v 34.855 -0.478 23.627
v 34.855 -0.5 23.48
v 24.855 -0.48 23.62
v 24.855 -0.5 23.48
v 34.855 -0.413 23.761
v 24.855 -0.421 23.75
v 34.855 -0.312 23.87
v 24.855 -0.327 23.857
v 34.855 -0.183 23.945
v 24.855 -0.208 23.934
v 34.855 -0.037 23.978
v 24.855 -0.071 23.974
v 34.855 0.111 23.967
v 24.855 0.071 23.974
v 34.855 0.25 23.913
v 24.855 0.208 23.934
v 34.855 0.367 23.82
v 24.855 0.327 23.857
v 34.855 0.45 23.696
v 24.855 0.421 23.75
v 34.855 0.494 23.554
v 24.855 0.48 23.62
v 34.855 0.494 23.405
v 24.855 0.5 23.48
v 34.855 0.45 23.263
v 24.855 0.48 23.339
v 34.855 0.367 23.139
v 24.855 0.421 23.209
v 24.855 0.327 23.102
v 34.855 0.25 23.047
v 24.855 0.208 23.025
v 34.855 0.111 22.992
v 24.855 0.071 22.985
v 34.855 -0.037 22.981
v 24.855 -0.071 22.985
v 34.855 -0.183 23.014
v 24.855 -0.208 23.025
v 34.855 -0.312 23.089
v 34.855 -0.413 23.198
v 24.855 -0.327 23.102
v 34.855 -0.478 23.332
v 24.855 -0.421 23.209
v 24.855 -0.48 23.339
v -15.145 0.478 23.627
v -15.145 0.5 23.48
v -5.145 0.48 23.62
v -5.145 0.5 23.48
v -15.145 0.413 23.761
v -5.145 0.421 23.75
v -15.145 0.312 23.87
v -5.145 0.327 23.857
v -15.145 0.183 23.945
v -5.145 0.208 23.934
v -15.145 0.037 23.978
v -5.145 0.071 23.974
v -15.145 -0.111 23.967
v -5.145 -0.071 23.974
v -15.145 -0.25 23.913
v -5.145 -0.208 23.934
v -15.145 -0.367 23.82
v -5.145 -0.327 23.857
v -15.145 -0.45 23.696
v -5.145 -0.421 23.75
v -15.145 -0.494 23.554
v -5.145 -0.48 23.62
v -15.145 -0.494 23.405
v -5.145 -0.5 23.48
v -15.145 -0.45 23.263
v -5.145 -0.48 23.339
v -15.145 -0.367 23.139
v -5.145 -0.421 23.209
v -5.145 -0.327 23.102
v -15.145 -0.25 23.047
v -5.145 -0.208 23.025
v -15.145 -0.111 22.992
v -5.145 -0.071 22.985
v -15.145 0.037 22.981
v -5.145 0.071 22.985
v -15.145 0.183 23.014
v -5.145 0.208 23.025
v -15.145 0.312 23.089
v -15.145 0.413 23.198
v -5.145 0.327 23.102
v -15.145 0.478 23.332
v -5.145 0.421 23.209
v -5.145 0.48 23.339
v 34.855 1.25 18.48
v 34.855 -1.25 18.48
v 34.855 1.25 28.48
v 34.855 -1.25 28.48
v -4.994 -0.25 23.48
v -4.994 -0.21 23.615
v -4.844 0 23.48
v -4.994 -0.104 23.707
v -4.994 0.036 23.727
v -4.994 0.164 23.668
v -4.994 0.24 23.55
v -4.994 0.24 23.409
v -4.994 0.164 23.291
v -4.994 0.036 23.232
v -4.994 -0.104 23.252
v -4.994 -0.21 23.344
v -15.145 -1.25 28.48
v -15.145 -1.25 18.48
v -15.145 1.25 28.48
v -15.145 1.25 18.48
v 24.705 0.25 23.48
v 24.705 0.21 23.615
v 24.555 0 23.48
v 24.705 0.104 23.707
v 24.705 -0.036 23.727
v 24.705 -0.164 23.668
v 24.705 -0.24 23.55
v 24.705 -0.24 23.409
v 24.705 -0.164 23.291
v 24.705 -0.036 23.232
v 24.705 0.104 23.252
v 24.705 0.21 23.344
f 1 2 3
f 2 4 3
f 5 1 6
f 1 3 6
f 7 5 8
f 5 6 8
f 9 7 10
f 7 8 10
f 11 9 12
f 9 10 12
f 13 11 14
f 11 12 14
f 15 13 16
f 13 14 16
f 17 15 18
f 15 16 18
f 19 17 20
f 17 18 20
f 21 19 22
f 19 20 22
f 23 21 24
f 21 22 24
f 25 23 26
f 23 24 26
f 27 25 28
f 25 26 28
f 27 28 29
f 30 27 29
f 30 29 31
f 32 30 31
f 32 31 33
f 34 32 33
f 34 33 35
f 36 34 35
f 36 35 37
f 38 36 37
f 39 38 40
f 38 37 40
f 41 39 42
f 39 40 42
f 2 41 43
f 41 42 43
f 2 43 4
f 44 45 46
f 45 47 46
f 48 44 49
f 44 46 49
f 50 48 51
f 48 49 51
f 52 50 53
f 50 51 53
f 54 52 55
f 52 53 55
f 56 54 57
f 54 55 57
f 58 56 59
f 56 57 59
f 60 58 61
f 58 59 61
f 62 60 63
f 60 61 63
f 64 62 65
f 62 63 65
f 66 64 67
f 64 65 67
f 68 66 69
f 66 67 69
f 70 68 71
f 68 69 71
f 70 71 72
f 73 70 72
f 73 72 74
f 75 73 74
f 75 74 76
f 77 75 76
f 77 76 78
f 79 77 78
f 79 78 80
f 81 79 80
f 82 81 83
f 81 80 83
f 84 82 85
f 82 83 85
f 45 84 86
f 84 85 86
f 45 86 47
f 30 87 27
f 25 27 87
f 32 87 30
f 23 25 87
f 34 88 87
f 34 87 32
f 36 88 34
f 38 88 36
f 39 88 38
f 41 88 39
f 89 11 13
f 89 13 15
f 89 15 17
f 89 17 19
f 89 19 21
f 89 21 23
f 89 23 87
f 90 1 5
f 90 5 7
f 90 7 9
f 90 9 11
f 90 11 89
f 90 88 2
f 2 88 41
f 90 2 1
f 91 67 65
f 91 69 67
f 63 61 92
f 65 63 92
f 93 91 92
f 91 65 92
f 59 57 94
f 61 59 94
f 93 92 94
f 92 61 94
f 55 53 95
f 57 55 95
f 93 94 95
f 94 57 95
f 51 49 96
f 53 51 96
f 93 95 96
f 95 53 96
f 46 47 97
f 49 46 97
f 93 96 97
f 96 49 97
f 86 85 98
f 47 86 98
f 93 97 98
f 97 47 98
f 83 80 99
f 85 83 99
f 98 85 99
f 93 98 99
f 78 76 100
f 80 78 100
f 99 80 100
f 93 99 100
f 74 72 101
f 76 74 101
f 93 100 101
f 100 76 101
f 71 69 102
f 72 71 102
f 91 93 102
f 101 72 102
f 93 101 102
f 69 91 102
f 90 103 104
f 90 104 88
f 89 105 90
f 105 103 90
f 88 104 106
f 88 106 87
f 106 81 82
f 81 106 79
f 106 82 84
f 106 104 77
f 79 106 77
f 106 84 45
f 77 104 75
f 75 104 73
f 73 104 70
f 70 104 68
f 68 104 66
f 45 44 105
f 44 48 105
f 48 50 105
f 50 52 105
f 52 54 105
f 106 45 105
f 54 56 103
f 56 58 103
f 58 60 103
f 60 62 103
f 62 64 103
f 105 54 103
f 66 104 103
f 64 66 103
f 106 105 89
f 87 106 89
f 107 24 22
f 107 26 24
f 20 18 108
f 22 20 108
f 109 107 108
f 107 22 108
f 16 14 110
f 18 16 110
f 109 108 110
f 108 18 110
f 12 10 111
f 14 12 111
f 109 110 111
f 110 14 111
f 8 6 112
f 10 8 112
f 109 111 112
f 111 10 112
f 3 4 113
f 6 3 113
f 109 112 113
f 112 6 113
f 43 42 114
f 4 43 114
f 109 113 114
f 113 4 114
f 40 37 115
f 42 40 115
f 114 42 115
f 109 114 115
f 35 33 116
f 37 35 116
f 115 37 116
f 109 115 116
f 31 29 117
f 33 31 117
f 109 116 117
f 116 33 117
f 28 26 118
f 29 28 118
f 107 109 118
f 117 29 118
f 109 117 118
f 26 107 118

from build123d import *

# Parameters (mm, degrees)
F0_W     = 50
F0_H     = 10
F1_DEPTH = 1.25
F4_D     = 1
F4_DEPTH = 10
F4_TIP   = 0.3004303095
F5_D     = 1
F5_DEPTH = 10
F5_TIP   = 0.3004303095


with BuildPart() as f1:
    # F0 (on Front) → F1 (new body, symmetric)
    with BuildSketch(Plane.XZ):
        with Locations((9.8554845899, 23.4795556)):
            Rectangle(F0_W, F0_H)
    extrude(amount=F1_DEPTH, both=True)

    # F4
    with Locations(Plane.YZ.offset(34.8554845899)):
        with Locations((0, 23.4795556)):
            Hole(F4_D / 2, depth=F4_DEPTH)
            with Locations((0, 0, -(F4_DEPTH + F4_TIP / 2))):  # 118° drill point
                Cone(0, F4_D / 2, F4_TIP, mode=Mode.SUBTRACT)

    # F5
    with Locations(Plane(origin=(-15.1445154101, 0, 0), x_dir=(0, -1, 0), z_dir=(-1, 0, 0))):
        with Locations((0, 23.4795556)):
            Hole(F5_D / 2, depth=F5_DEPTH)
            with Locations((0, 0, -(F5_DEPTH + F5_TIP / 2))):  # 118° drill point
                Cone(0, F5_D / 2, F5_TIP, mode=Mode.SUBTRACT)


solid = f1.part
